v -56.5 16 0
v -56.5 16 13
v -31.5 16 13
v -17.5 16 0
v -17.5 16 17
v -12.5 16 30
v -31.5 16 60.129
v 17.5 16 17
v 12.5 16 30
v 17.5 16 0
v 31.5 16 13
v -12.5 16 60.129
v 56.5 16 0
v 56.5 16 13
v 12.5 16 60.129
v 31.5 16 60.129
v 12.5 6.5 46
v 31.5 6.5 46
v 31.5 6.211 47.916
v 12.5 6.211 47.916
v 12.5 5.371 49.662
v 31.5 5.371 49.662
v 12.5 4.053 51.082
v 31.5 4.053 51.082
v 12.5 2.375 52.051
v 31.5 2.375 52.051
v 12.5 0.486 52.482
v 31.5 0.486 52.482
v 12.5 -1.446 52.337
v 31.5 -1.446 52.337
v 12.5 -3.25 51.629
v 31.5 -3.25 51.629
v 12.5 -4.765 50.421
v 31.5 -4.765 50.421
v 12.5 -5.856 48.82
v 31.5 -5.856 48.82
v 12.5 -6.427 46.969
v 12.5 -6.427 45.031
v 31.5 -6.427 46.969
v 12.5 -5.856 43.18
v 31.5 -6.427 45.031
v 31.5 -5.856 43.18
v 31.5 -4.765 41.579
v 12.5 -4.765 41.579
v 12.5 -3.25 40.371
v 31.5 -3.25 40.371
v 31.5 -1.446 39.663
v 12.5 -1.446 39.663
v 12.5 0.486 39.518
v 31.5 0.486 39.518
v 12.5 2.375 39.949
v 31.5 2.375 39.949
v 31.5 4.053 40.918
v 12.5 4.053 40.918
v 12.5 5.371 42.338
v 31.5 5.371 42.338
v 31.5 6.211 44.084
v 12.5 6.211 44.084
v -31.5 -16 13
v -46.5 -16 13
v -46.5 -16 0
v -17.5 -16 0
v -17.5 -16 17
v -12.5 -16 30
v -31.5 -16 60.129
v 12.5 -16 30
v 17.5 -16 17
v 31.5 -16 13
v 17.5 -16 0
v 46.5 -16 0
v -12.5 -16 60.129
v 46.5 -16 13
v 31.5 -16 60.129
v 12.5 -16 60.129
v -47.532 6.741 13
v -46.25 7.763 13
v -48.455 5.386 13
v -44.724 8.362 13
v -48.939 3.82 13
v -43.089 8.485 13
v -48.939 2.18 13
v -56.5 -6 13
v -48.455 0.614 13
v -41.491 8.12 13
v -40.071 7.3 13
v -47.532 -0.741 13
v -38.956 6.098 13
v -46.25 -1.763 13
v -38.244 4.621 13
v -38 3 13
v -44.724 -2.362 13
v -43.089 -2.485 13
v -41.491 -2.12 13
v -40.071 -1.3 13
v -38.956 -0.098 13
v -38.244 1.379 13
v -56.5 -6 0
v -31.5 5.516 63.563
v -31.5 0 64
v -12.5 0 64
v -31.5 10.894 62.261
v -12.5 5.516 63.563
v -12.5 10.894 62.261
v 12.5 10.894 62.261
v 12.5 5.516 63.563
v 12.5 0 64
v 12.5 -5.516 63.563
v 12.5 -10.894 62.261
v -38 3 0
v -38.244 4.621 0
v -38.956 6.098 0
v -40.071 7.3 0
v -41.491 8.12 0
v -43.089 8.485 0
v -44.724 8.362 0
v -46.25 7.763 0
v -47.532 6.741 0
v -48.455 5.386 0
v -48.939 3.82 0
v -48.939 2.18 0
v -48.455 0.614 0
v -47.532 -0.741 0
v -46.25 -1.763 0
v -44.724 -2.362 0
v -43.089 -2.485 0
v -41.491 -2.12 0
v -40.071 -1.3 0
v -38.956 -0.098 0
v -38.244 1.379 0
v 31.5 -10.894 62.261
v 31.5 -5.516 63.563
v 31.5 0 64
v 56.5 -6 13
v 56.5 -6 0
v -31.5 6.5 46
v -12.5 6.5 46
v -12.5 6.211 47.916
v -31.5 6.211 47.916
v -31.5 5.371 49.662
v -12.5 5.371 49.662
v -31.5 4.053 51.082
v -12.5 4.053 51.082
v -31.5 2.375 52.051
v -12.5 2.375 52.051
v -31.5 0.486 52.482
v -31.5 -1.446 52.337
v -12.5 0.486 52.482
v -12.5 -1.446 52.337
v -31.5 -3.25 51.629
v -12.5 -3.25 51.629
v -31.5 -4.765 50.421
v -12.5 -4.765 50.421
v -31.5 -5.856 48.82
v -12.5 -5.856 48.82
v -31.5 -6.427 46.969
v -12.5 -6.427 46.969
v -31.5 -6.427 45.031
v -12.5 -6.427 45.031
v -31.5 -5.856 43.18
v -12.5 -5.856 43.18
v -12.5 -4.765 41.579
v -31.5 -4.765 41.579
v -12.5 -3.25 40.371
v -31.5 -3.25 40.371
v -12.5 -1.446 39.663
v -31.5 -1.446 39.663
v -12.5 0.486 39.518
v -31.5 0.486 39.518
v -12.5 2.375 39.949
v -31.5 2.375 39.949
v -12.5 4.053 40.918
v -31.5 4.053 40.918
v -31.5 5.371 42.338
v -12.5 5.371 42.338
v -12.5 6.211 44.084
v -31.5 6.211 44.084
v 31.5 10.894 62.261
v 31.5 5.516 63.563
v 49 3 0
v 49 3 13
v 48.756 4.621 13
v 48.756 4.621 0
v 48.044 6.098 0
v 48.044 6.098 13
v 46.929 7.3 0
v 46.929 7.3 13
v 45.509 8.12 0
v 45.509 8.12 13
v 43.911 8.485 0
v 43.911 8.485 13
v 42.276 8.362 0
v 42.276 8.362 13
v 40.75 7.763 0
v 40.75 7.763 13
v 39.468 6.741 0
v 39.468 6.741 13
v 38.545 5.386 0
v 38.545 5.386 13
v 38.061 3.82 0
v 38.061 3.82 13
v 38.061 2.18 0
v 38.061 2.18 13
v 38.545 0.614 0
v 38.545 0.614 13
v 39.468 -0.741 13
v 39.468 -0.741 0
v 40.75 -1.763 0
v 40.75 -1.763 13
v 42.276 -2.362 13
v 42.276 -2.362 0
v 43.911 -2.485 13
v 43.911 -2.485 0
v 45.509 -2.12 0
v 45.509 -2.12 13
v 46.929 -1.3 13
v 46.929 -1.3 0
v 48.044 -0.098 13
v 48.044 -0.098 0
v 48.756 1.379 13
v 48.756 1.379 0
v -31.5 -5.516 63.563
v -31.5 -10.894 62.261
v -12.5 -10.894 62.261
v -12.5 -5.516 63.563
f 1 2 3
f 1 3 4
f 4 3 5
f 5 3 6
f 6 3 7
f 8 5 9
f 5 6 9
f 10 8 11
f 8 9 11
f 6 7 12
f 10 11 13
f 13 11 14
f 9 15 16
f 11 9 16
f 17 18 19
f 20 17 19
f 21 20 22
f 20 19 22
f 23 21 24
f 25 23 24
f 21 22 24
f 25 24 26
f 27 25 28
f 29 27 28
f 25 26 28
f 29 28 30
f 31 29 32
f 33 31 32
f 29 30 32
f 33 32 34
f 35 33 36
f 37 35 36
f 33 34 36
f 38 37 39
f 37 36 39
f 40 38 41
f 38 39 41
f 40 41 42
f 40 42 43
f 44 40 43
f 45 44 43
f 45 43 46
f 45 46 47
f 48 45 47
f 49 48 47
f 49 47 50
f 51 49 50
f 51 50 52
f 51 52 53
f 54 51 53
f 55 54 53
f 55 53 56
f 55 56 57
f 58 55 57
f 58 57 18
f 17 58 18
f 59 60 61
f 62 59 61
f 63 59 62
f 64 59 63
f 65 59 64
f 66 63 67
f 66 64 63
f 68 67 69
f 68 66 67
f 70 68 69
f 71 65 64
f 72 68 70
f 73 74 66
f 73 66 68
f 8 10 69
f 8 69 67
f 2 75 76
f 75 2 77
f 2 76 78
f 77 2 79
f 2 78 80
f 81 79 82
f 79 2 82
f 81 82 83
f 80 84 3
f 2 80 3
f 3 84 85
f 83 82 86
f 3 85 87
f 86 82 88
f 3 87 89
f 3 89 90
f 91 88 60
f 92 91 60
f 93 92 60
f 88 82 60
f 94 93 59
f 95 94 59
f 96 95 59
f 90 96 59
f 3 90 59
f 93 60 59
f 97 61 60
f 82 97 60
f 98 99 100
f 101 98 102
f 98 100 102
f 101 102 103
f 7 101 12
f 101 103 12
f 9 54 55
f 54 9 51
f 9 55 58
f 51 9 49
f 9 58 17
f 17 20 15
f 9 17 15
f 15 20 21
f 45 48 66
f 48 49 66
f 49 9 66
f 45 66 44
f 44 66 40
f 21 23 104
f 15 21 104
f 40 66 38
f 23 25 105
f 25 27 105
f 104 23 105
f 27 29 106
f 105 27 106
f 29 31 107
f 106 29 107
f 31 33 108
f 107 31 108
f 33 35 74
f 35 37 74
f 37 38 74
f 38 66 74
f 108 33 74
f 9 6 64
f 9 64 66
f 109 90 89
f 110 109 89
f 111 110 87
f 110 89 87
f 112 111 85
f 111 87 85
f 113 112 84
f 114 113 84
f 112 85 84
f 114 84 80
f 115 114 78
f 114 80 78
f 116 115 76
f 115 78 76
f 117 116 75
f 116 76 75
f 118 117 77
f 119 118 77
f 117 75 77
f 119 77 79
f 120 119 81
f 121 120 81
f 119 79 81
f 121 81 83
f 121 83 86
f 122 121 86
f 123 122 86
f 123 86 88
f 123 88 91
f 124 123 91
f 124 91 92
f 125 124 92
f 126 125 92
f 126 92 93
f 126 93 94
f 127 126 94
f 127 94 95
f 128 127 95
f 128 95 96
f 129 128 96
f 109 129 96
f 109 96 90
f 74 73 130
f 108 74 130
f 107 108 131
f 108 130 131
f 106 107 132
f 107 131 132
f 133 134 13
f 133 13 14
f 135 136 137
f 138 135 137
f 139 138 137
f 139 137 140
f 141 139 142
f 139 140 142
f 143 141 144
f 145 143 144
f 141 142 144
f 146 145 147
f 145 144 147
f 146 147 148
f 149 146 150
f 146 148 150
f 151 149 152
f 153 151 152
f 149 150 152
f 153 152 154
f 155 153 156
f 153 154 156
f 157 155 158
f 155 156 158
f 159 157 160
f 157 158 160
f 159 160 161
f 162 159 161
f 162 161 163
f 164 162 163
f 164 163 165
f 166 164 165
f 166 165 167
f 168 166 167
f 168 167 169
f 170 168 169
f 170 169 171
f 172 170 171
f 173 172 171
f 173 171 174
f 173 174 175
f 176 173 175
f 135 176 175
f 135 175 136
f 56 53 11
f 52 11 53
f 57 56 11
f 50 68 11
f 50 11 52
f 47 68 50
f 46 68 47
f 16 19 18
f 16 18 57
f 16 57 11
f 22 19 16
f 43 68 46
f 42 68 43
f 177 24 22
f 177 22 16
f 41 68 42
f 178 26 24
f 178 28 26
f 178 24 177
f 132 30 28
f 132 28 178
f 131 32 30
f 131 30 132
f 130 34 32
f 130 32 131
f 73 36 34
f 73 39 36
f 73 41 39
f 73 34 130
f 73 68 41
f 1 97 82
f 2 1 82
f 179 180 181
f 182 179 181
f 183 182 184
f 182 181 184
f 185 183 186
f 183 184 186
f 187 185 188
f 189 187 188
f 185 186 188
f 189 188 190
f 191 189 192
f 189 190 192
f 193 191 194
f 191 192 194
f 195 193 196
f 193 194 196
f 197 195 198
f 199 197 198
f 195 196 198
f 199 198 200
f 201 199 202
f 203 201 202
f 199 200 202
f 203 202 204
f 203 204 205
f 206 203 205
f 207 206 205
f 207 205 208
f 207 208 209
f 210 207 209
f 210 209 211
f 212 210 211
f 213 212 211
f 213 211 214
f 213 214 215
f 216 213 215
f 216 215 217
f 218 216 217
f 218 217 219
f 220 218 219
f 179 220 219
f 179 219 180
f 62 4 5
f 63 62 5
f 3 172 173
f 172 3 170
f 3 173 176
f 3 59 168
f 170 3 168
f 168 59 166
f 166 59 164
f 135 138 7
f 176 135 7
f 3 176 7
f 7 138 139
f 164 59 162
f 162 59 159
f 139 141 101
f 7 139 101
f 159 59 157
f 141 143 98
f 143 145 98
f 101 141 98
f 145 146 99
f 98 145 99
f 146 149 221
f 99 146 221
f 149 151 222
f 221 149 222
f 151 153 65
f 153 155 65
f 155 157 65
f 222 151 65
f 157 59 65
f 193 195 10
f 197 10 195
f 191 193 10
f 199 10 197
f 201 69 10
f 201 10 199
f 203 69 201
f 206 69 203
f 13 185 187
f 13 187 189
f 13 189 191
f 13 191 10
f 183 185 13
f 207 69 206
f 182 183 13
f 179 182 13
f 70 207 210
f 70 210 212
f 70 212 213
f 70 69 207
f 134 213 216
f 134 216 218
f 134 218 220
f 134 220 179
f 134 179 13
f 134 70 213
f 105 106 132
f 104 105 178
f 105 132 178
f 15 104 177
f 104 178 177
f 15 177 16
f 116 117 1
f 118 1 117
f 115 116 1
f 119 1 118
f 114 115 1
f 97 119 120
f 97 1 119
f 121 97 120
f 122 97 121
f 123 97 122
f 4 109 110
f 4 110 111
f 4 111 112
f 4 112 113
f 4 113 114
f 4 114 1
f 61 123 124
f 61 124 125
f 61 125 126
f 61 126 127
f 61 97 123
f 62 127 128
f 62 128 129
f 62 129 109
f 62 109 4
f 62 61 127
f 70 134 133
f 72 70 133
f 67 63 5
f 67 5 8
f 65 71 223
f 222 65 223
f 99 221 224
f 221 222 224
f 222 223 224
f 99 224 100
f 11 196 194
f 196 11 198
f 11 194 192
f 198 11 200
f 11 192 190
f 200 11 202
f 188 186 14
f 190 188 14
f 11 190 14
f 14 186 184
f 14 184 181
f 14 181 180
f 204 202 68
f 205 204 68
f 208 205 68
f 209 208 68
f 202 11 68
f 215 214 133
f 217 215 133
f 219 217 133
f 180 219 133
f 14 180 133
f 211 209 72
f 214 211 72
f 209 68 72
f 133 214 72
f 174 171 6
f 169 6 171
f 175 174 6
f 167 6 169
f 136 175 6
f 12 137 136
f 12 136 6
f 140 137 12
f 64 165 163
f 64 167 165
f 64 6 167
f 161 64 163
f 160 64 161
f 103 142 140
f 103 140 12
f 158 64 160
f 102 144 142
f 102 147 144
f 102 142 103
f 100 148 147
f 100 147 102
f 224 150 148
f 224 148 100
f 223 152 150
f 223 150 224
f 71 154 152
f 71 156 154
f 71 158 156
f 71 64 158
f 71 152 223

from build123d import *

# Parameters (mm, degrees)
F0_W     = 113
F0_H     = 64
F1_DEPTH = 16
F2_W     = 25
F2_H     = 51
F2_H_2   = 34
F2_W_2   = 35
F2_H_3   = 17
F3_DEPTH = 32.001
F4_R     = 6.5
F5_DEPTH = 88.001
F7_R     = 5.5
F8_DEPTH = 64.001
F9_SIZE  = 10


with BuildPart() as f1:
    # F0 (on Front) → F1 (new body, symmetric)
    with BuildSketch(Plane.XZ):
        with Locations((0, 32)):
            Rectangle(F0_W, F0_H)
    extrude(amount=F1_DEPTH, both=True)

    # F2 (on face) → F3 (cut, through all)
    with BuildSketch(Plane.XZ.offset(16)):
        with Locations((-44, 38.5)):
            Rectangle(F2_W, F2_H)
        with Locations((44, 38.5)):
            Rectangle(F2_W, F2_H)
        with Locations((0, 47)):
            Rectangle(F2_W, F2_H_2)
        with Locations((0, 8.5)):
            Rectangle(F2_W_2, F2_H_3)
    extrude(amount=-F3_DEPTH, mode=Mode.SUBTRACT)

    # F4 (on face) → F5 (cut, through all)
    with BuildSketch(Plane.YZ.offset(31.5)):
        with BuildLine():
            ThreePointArc((-16, 60.1287648325), (-8.2308332161, 63.0184271325), (0, 64))
            Line((0, 64), (-16, 64))
            Line((-16, 64), (-16, 60.1287648325))
        make_face()
        with BuildLine():
            ThreePointArc((0, 64), (8.230833216, 63.0184271325), (16, 60.1287648325))
            Line((16, 60.1287648325), (16, 64))
            Line((16, 64), (0, 64))
        make_face()
        with Locations((0, 46)):
            Circle(F4_R)
    extrude(amount=-F5_DEPTH, mode=Mode.SUBTRACT)

    # F7 (on offset) → F8 (cut, through all)
    with BuildSketch(Plane.XY.offset(64)):
        with Locations((-43.5, 3)):
            Circle(F7_R)
        with Locations((43.5, 3)):
            Circle(F7_R)
    extrude(amount=-F8_DEPTH, mode=Mode.SUBTRACT)

    # F9
    f9_edges = [f1.edges().sort_by_distance(p)[0] for p in [
        (56.5, -16, 6.5),
        (-56.5, -16, 6.5),
    ]]
    chamfer(f9_edges, length=F9_SIZE)


solid = f1.part
